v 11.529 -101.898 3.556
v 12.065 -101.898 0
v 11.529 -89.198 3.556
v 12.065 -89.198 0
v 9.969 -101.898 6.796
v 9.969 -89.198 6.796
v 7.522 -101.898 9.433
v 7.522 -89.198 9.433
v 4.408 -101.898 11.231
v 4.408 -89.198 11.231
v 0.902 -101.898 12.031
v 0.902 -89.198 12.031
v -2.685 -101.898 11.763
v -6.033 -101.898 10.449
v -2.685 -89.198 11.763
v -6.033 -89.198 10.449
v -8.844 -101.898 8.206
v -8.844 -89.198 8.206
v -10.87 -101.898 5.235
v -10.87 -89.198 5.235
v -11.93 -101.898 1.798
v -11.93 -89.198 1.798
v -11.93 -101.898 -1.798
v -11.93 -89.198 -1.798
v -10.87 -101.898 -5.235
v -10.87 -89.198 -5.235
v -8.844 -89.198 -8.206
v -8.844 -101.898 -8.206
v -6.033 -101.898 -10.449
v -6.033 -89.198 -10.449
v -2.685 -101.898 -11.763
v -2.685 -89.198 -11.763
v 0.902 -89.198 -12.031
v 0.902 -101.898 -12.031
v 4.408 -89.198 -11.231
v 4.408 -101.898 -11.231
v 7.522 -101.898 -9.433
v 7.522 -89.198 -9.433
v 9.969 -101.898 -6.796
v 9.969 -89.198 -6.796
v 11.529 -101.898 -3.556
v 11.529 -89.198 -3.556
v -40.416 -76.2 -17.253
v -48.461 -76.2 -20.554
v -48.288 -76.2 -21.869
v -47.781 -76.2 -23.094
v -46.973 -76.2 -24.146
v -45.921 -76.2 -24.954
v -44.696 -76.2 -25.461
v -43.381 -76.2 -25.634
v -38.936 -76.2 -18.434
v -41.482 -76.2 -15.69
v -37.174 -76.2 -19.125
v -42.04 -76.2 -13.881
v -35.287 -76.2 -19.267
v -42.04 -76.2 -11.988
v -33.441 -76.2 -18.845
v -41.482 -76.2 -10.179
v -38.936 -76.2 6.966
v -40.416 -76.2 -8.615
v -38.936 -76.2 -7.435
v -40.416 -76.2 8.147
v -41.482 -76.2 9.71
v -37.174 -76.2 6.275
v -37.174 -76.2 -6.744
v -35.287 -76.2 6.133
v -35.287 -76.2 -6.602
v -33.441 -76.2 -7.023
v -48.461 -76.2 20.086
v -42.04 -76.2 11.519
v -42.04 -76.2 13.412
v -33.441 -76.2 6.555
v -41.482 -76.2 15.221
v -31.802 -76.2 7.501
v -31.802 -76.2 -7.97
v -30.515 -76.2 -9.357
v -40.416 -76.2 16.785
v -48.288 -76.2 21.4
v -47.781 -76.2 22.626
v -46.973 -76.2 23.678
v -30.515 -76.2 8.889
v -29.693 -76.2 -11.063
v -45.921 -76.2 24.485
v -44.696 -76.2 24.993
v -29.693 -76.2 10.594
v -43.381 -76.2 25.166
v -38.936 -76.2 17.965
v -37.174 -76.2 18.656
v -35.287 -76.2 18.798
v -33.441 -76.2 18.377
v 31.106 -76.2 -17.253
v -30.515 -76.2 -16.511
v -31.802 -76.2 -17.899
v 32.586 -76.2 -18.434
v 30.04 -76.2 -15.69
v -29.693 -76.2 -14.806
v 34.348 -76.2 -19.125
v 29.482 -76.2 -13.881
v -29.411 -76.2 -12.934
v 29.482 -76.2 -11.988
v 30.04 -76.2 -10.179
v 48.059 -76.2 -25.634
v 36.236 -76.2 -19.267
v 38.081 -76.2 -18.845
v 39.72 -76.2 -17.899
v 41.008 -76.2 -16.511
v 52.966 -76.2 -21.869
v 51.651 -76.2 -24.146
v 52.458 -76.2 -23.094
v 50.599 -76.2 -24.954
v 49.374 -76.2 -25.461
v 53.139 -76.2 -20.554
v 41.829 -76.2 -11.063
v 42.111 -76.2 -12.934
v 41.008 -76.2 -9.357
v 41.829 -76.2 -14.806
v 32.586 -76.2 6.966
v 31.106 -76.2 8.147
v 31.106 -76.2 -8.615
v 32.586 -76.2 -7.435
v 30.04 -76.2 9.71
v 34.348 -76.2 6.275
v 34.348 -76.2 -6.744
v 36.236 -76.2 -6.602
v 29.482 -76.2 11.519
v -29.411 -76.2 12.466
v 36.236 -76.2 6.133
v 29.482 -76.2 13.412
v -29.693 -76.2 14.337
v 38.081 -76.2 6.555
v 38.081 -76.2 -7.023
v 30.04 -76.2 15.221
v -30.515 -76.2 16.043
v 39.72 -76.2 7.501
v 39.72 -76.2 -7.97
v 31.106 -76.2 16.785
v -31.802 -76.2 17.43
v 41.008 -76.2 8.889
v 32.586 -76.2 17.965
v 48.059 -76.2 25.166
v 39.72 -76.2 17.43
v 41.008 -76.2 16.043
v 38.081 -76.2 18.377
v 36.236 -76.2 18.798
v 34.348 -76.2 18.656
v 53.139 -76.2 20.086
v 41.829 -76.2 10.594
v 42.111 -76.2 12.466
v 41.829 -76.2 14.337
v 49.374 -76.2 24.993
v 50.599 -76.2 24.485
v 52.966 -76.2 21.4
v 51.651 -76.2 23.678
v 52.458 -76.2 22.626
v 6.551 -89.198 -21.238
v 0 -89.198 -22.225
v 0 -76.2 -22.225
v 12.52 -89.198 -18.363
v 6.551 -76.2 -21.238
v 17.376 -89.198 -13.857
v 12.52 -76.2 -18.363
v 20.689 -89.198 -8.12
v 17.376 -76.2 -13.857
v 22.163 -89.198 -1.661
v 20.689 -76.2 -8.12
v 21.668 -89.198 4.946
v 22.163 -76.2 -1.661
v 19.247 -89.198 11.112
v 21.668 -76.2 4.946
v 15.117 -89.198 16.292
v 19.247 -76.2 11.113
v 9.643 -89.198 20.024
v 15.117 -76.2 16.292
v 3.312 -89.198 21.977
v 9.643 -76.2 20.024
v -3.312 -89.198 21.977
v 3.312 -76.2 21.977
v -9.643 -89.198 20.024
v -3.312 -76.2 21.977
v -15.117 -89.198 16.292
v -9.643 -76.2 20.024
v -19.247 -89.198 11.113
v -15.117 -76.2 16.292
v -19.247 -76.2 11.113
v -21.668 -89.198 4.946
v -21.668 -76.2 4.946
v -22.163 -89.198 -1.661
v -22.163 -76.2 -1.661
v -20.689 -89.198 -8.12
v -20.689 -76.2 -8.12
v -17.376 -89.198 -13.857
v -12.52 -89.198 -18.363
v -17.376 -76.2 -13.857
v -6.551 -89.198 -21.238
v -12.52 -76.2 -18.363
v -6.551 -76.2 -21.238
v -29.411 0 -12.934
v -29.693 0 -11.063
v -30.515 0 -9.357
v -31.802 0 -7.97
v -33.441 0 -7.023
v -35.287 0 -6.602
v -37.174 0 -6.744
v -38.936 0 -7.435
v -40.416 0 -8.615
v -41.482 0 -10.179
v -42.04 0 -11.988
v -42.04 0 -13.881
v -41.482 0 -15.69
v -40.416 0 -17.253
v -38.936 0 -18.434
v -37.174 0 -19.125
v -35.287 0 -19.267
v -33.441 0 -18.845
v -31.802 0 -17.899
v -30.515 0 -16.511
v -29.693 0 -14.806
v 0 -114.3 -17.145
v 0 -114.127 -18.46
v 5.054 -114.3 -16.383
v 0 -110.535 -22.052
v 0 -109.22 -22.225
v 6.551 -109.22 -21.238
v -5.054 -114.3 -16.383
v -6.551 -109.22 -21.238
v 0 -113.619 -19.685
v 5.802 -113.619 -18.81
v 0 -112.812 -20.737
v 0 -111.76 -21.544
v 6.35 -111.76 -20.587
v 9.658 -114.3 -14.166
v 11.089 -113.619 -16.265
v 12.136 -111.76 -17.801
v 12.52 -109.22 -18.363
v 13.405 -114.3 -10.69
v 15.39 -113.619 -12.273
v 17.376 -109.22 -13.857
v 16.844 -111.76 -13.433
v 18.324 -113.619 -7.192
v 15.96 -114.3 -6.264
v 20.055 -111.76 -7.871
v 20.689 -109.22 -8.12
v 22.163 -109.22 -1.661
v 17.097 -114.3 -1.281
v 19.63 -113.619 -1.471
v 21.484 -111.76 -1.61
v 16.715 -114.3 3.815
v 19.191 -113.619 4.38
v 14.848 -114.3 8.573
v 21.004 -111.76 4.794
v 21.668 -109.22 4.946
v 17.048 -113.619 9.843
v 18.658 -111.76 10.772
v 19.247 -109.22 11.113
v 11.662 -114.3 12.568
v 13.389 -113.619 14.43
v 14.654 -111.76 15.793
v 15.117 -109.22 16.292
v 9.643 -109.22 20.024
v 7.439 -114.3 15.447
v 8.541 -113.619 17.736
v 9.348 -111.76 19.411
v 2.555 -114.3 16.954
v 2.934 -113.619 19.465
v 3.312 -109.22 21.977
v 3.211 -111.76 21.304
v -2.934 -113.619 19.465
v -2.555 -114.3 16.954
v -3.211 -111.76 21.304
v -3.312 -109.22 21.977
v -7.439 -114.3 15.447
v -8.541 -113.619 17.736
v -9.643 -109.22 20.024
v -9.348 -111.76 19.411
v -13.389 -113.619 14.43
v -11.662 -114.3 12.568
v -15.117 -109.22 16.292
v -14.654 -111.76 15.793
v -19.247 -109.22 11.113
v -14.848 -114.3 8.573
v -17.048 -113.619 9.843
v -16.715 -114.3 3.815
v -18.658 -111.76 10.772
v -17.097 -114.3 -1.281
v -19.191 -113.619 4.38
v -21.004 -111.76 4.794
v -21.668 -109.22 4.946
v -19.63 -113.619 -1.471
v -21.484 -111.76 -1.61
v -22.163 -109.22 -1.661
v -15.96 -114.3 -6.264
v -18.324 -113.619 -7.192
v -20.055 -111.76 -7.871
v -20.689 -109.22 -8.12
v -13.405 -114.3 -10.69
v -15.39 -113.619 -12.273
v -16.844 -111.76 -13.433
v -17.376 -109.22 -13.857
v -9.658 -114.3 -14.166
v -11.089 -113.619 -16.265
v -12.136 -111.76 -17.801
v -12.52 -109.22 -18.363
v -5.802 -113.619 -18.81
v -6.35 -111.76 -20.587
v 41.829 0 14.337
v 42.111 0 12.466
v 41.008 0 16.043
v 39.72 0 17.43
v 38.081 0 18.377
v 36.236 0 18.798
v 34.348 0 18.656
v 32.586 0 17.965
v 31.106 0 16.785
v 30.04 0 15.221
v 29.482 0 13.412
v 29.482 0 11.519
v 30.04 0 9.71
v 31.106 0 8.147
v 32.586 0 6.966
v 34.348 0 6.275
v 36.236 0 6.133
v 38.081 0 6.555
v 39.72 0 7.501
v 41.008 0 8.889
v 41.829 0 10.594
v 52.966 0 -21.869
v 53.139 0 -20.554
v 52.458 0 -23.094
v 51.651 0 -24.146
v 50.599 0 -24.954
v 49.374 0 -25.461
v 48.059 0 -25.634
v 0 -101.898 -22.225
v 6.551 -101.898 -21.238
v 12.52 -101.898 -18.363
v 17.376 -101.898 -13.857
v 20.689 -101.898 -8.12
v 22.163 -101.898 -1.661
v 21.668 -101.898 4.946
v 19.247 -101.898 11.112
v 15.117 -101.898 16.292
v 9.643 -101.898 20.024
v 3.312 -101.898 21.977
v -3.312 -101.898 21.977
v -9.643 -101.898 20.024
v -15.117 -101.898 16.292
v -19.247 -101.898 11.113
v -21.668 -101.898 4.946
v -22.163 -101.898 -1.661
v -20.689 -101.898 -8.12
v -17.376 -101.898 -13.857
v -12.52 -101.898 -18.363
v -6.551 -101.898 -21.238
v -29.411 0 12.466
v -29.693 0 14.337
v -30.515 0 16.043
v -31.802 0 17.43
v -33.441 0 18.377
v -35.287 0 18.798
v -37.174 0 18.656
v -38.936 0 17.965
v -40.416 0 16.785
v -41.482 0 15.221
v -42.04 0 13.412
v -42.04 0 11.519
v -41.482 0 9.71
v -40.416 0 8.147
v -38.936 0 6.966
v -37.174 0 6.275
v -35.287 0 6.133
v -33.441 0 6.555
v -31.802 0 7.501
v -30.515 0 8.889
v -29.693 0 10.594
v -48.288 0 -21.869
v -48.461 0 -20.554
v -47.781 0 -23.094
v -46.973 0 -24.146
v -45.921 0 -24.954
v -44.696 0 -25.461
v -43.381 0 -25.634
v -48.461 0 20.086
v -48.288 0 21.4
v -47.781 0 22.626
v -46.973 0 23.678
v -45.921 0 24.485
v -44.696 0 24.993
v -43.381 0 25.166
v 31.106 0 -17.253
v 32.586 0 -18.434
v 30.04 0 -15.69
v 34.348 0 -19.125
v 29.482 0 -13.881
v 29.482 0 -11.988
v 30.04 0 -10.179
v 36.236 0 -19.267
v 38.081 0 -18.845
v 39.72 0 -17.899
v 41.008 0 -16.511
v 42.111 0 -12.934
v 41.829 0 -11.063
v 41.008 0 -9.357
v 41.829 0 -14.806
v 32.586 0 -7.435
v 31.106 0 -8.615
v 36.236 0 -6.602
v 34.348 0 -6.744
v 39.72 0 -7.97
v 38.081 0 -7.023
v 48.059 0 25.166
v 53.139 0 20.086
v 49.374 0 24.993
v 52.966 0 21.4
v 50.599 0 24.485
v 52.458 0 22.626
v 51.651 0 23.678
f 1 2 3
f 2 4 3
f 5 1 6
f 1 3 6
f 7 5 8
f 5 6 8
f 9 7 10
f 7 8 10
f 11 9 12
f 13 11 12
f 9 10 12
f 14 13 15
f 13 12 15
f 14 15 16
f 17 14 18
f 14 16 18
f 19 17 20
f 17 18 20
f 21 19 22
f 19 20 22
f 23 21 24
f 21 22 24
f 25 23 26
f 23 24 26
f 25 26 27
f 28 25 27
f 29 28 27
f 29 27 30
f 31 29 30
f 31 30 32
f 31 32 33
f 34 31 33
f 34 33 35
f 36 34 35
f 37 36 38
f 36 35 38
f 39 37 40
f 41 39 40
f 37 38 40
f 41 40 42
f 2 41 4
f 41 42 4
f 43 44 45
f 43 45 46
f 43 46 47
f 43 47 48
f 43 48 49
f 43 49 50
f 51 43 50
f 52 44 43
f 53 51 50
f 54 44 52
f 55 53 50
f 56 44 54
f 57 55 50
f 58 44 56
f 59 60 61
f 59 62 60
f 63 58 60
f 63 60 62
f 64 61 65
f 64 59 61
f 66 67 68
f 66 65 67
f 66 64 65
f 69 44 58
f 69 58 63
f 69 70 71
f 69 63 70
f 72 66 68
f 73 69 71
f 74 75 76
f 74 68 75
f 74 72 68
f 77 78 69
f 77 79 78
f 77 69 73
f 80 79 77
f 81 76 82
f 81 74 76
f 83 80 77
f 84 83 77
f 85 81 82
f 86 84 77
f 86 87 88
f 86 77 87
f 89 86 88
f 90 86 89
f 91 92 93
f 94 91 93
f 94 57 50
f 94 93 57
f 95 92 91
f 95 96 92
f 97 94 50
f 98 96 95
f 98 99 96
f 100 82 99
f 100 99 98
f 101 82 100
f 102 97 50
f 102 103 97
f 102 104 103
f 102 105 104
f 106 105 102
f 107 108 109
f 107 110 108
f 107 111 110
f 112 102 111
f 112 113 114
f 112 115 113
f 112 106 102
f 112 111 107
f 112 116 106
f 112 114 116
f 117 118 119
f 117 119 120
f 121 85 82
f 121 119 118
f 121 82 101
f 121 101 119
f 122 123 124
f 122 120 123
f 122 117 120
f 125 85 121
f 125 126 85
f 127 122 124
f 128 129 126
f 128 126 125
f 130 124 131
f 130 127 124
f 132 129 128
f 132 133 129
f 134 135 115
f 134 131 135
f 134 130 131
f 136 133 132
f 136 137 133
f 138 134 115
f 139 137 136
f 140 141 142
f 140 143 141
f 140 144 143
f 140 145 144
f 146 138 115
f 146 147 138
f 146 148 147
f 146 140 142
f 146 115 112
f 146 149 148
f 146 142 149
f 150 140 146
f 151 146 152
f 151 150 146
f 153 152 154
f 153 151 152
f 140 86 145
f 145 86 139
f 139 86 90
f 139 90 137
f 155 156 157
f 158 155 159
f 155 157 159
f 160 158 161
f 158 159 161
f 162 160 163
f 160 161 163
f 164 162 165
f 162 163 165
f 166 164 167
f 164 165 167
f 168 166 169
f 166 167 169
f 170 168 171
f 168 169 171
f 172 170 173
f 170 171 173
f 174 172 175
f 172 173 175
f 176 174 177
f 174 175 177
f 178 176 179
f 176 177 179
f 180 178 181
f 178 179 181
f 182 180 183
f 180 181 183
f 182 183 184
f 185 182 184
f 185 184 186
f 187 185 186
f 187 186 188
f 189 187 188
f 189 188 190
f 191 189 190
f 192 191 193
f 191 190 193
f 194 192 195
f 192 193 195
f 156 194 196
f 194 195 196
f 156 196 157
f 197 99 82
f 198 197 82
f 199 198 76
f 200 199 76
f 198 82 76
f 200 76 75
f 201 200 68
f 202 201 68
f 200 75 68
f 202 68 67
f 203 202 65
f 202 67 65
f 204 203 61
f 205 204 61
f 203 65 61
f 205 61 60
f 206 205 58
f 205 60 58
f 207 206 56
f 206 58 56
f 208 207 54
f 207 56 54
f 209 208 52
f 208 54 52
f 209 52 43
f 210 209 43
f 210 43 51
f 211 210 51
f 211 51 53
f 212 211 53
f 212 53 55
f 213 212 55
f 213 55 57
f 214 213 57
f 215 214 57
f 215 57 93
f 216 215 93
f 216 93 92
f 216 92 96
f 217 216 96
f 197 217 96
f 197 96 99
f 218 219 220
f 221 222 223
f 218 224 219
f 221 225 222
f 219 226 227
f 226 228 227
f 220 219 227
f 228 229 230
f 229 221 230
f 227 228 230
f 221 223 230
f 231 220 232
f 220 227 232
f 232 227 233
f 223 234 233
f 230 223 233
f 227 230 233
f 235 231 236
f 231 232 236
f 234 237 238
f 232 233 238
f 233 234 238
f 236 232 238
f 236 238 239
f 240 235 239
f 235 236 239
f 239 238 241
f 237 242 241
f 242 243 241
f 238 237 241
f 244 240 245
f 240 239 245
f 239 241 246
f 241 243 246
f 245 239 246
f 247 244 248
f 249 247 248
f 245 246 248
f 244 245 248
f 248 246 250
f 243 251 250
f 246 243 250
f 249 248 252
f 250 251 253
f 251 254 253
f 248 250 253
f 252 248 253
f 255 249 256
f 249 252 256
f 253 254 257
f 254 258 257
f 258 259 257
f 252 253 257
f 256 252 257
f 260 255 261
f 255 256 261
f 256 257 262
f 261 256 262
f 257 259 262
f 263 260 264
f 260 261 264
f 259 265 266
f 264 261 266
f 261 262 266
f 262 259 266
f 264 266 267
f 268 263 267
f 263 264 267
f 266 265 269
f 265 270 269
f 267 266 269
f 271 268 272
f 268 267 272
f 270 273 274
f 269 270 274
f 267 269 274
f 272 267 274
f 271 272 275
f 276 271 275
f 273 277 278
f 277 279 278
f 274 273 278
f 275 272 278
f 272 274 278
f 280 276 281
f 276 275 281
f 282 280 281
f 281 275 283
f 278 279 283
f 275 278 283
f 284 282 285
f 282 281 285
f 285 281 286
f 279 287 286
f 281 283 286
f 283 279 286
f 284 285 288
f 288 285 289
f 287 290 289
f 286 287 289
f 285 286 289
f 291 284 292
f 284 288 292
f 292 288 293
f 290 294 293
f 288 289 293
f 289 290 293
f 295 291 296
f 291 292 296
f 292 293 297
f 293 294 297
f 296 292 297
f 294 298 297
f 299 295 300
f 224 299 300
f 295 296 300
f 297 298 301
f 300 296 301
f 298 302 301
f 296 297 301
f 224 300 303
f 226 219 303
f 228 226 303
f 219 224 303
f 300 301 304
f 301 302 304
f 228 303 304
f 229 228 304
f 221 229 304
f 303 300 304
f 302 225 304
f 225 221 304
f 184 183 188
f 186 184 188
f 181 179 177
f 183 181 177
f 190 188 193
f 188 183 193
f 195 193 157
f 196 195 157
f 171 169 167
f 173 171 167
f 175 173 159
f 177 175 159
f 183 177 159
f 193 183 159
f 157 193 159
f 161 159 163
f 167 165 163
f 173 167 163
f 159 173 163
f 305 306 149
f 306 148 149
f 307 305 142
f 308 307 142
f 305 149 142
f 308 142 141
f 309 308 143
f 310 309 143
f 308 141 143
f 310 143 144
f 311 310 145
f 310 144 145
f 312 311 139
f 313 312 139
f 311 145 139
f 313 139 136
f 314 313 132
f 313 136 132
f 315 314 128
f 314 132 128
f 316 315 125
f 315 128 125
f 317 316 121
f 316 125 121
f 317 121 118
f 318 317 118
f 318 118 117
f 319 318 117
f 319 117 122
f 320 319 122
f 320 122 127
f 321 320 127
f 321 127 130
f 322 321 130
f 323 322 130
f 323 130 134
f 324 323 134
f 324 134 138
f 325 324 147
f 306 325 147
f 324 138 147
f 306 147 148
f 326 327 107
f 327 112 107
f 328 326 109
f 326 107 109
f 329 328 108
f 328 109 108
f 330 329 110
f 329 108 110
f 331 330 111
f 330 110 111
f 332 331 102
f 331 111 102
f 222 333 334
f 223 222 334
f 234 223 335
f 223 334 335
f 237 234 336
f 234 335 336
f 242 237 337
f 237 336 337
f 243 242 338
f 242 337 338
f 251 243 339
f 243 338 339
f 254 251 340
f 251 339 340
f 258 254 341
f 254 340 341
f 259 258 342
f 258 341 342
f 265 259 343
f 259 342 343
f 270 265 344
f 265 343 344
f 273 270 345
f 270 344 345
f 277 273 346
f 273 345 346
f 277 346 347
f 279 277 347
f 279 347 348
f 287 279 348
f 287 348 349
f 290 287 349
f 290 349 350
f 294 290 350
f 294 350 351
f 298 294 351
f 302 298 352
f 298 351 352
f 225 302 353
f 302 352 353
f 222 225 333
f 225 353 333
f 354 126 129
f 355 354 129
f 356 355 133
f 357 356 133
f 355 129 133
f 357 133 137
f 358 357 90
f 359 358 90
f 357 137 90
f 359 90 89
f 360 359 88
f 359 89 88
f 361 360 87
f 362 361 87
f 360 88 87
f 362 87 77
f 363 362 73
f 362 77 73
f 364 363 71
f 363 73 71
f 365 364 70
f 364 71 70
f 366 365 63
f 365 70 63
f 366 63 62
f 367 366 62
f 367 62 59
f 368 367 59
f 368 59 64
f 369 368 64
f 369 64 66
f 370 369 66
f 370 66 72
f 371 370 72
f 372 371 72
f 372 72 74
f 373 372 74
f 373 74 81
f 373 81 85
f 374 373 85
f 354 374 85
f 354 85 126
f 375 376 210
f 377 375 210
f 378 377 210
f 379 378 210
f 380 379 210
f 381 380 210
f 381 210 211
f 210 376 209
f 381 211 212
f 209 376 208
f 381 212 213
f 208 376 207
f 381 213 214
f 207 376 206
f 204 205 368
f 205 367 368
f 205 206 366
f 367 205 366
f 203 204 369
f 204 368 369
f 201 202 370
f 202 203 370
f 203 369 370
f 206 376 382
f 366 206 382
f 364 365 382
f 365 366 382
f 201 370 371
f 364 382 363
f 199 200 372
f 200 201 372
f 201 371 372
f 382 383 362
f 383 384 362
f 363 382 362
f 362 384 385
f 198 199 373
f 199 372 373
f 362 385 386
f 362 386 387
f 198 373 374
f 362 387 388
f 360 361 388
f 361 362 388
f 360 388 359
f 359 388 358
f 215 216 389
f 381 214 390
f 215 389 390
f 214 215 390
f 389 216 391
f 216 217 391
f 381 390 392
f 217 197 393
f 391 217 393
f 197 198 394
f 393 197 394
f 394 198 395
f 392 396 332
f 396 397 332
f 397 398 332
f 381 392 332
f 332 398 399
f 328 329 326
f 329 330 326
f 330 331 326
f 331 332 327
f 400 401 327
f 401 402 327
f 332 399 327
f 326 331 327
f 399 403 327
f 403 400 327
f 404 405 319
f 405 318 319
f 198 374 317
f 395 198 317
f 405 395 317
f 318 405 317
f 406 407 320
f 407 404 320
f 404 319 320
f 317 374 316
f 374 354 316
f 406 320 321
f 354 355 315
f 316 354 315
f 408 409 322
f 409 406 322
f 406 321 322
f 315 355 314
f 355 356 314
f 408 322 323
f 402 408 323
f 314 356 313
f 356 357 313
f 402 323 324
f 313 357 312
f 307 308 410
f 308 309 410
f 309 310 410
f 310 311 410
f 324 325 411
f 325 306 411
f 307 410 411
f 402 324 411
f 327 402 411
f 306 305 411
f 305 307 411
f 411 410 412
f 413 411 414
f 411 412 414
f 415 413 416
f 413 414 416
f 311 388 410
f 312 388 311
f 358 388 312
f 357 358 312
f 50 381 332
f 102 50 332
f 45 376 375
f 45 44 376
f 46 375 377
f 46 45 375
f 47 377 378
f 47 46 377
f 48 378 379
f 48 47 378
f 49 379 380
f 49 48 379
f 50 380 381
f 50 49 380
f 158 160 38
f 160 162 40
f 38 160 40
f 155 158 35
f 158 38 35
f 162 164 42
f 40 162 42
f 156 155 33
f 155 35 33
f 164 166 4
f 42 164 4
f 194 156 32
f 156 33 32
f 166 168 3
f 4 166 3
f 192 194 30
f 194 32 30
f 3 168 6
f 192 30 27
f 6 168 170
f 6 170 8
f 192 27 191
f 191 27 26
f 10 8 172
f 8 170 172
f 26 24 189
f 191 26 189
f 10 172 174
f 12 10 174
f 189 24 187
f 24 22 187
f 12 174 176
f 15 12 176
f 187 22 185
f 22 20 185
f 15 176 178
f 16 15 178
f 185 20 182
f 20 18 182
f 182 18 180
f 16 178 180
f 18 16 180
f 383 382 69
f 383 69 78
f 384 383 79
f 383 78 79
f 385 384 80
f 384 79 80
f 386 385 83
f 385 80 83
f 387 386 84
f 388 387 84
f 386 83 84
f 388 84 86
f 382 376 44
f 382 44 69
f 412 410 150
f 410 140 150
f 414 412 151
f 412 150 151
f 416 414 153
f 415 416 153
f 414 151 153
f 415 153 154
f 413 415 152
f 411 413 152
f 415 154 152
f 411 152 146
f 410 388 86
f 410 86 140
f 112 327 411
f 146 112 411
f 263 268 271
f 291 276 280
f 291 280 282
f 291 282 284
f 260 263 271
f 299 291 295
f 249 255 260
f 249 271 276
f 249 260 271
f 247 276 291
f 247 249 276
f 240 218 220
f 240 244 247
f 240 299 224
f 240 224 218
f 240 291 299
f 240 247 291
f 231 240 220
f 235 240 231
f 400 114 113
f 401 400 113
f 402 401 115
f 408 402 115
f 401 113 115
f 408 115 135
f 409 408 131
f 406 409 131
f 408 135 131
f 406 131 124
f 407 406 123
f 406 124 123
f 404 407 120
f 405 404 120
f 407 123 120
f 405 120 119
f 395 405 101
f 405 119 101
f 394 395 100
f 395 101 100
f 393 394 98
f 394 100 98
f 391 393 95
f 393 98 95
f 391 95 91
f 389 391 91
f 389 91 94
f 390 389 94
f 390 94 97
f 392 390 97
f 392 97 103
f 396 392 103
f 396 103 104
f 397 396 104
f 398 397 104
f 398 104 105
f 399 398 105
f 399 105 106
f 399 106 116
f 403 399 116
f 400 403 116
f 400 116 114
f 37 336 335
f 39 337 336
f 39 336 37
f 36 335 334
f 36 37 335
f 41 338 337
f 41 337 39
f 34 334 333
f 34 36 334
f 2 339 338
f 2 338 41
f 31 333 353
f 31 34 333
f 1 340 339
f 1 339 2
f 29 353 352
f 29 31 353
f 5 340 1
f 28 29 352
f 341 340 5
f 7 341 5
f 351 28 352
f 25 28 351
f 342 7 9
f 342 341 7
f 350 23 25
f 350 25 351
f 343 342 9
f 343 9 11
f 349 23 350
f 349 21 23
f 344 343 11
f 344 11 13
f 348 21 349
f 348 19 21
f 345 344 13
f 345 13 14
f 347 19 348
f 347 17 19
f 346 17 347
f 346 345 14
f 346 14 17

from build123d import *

# Parameters (mm, degrees)
F0_W     = 101.6
F0_H     = 50.8
F1_DEPTH = 76.2
F2_R     = 6.35
F3_DEPTH = 25.4
F4_DEPTH = 76.201
F5_W     = 38.1
F5_H     = 22.225
F7_W     = 10.16
F7_H     = 12.7
F9_R     = 5.08
F10_R    = 5.08
F11_R    = 5.08


with BuildPart() as f1:
    # F0 (on Front) → F1 (new body)
    with BuildSketch(Plane.XZ):
        with Locations((2.3388, -0.234386)):
            Rectangle(F0_W, F0_H)
    extrude(amount=F1_DEPTH)

    # F2 (on face) → F3 (cut)
    with BuildSketch(Plane.XZ.offset(76.2)):
        with Locations((35.7612, 12.465614)):
            Circle(F2_R)
    extrude(amount=-F3_DEPTH, mode=Mode.SUBTRACT)

    # F2 (on face) → F4 (cut, through all)
    with BuildSketch(Plane.XZ.offset(76.2)):
        with Locations((-35.7612, 12.465614)):
            Circle(F2_R)
        with Locations((-35.7612, -12.934386)):
            Circle(F2_R)
        with Locations((35.7612, 12.465614)):
            Circle(F2_R)
        with Locations((35.7612, -12.934386)):
            Circle(F2_R)
    extrude(amount=-F4_DEPTH, mode=Mode.SUBTRACT)

    # F10
    f10_edges = [f1.edges().sort_by_distance(p)[0] for p in [
        (-48.4612, -38.1, -25.634386),
        (53.1388, -38.1, -25.634386),
        (-48.4612, -38.1, 25.165614),
    ]]
    fillet(f10_edges, radius=F10_R)

    # F11
    f11_edges = [f1.edges().sort_by_distance(p)[0] for p in [
        (53.1388, -38.1, 25.165614),
    ]]
    fillet(f11_edges, radius=F11_R)


with BuildPart() as f6:
    # F5 (on Right) → F6 (revolve)
    with BuildSketch(Plane.YZ):
        with Locations((-95.25, -11.1125)):
            Rectangle(F5_W, F5_H)
    revolve(axis=Axis((0, -95.25, 0), (0, -1, 0)))

    # F7 (on Top) → F8 (revolve, cut)
    with BuildSketch(Plane.XY):
        with Locations((17.145, -95.547635)):
            Rectangle(F7_W, F7_H)
    revolve(axis=Axis((0, -70.485167, 0), (0, -1, 0)), mode=Mode.SUBTRACT)

    # F9
    f9_edges = [f6.edges().sort_by_distance(p)[0] for p in [
        (0, -114.3, 22.225),
    ]]
    fillet(f9_edges, radius=F9_R)


solid = Compound([f1.part, f6.part])
